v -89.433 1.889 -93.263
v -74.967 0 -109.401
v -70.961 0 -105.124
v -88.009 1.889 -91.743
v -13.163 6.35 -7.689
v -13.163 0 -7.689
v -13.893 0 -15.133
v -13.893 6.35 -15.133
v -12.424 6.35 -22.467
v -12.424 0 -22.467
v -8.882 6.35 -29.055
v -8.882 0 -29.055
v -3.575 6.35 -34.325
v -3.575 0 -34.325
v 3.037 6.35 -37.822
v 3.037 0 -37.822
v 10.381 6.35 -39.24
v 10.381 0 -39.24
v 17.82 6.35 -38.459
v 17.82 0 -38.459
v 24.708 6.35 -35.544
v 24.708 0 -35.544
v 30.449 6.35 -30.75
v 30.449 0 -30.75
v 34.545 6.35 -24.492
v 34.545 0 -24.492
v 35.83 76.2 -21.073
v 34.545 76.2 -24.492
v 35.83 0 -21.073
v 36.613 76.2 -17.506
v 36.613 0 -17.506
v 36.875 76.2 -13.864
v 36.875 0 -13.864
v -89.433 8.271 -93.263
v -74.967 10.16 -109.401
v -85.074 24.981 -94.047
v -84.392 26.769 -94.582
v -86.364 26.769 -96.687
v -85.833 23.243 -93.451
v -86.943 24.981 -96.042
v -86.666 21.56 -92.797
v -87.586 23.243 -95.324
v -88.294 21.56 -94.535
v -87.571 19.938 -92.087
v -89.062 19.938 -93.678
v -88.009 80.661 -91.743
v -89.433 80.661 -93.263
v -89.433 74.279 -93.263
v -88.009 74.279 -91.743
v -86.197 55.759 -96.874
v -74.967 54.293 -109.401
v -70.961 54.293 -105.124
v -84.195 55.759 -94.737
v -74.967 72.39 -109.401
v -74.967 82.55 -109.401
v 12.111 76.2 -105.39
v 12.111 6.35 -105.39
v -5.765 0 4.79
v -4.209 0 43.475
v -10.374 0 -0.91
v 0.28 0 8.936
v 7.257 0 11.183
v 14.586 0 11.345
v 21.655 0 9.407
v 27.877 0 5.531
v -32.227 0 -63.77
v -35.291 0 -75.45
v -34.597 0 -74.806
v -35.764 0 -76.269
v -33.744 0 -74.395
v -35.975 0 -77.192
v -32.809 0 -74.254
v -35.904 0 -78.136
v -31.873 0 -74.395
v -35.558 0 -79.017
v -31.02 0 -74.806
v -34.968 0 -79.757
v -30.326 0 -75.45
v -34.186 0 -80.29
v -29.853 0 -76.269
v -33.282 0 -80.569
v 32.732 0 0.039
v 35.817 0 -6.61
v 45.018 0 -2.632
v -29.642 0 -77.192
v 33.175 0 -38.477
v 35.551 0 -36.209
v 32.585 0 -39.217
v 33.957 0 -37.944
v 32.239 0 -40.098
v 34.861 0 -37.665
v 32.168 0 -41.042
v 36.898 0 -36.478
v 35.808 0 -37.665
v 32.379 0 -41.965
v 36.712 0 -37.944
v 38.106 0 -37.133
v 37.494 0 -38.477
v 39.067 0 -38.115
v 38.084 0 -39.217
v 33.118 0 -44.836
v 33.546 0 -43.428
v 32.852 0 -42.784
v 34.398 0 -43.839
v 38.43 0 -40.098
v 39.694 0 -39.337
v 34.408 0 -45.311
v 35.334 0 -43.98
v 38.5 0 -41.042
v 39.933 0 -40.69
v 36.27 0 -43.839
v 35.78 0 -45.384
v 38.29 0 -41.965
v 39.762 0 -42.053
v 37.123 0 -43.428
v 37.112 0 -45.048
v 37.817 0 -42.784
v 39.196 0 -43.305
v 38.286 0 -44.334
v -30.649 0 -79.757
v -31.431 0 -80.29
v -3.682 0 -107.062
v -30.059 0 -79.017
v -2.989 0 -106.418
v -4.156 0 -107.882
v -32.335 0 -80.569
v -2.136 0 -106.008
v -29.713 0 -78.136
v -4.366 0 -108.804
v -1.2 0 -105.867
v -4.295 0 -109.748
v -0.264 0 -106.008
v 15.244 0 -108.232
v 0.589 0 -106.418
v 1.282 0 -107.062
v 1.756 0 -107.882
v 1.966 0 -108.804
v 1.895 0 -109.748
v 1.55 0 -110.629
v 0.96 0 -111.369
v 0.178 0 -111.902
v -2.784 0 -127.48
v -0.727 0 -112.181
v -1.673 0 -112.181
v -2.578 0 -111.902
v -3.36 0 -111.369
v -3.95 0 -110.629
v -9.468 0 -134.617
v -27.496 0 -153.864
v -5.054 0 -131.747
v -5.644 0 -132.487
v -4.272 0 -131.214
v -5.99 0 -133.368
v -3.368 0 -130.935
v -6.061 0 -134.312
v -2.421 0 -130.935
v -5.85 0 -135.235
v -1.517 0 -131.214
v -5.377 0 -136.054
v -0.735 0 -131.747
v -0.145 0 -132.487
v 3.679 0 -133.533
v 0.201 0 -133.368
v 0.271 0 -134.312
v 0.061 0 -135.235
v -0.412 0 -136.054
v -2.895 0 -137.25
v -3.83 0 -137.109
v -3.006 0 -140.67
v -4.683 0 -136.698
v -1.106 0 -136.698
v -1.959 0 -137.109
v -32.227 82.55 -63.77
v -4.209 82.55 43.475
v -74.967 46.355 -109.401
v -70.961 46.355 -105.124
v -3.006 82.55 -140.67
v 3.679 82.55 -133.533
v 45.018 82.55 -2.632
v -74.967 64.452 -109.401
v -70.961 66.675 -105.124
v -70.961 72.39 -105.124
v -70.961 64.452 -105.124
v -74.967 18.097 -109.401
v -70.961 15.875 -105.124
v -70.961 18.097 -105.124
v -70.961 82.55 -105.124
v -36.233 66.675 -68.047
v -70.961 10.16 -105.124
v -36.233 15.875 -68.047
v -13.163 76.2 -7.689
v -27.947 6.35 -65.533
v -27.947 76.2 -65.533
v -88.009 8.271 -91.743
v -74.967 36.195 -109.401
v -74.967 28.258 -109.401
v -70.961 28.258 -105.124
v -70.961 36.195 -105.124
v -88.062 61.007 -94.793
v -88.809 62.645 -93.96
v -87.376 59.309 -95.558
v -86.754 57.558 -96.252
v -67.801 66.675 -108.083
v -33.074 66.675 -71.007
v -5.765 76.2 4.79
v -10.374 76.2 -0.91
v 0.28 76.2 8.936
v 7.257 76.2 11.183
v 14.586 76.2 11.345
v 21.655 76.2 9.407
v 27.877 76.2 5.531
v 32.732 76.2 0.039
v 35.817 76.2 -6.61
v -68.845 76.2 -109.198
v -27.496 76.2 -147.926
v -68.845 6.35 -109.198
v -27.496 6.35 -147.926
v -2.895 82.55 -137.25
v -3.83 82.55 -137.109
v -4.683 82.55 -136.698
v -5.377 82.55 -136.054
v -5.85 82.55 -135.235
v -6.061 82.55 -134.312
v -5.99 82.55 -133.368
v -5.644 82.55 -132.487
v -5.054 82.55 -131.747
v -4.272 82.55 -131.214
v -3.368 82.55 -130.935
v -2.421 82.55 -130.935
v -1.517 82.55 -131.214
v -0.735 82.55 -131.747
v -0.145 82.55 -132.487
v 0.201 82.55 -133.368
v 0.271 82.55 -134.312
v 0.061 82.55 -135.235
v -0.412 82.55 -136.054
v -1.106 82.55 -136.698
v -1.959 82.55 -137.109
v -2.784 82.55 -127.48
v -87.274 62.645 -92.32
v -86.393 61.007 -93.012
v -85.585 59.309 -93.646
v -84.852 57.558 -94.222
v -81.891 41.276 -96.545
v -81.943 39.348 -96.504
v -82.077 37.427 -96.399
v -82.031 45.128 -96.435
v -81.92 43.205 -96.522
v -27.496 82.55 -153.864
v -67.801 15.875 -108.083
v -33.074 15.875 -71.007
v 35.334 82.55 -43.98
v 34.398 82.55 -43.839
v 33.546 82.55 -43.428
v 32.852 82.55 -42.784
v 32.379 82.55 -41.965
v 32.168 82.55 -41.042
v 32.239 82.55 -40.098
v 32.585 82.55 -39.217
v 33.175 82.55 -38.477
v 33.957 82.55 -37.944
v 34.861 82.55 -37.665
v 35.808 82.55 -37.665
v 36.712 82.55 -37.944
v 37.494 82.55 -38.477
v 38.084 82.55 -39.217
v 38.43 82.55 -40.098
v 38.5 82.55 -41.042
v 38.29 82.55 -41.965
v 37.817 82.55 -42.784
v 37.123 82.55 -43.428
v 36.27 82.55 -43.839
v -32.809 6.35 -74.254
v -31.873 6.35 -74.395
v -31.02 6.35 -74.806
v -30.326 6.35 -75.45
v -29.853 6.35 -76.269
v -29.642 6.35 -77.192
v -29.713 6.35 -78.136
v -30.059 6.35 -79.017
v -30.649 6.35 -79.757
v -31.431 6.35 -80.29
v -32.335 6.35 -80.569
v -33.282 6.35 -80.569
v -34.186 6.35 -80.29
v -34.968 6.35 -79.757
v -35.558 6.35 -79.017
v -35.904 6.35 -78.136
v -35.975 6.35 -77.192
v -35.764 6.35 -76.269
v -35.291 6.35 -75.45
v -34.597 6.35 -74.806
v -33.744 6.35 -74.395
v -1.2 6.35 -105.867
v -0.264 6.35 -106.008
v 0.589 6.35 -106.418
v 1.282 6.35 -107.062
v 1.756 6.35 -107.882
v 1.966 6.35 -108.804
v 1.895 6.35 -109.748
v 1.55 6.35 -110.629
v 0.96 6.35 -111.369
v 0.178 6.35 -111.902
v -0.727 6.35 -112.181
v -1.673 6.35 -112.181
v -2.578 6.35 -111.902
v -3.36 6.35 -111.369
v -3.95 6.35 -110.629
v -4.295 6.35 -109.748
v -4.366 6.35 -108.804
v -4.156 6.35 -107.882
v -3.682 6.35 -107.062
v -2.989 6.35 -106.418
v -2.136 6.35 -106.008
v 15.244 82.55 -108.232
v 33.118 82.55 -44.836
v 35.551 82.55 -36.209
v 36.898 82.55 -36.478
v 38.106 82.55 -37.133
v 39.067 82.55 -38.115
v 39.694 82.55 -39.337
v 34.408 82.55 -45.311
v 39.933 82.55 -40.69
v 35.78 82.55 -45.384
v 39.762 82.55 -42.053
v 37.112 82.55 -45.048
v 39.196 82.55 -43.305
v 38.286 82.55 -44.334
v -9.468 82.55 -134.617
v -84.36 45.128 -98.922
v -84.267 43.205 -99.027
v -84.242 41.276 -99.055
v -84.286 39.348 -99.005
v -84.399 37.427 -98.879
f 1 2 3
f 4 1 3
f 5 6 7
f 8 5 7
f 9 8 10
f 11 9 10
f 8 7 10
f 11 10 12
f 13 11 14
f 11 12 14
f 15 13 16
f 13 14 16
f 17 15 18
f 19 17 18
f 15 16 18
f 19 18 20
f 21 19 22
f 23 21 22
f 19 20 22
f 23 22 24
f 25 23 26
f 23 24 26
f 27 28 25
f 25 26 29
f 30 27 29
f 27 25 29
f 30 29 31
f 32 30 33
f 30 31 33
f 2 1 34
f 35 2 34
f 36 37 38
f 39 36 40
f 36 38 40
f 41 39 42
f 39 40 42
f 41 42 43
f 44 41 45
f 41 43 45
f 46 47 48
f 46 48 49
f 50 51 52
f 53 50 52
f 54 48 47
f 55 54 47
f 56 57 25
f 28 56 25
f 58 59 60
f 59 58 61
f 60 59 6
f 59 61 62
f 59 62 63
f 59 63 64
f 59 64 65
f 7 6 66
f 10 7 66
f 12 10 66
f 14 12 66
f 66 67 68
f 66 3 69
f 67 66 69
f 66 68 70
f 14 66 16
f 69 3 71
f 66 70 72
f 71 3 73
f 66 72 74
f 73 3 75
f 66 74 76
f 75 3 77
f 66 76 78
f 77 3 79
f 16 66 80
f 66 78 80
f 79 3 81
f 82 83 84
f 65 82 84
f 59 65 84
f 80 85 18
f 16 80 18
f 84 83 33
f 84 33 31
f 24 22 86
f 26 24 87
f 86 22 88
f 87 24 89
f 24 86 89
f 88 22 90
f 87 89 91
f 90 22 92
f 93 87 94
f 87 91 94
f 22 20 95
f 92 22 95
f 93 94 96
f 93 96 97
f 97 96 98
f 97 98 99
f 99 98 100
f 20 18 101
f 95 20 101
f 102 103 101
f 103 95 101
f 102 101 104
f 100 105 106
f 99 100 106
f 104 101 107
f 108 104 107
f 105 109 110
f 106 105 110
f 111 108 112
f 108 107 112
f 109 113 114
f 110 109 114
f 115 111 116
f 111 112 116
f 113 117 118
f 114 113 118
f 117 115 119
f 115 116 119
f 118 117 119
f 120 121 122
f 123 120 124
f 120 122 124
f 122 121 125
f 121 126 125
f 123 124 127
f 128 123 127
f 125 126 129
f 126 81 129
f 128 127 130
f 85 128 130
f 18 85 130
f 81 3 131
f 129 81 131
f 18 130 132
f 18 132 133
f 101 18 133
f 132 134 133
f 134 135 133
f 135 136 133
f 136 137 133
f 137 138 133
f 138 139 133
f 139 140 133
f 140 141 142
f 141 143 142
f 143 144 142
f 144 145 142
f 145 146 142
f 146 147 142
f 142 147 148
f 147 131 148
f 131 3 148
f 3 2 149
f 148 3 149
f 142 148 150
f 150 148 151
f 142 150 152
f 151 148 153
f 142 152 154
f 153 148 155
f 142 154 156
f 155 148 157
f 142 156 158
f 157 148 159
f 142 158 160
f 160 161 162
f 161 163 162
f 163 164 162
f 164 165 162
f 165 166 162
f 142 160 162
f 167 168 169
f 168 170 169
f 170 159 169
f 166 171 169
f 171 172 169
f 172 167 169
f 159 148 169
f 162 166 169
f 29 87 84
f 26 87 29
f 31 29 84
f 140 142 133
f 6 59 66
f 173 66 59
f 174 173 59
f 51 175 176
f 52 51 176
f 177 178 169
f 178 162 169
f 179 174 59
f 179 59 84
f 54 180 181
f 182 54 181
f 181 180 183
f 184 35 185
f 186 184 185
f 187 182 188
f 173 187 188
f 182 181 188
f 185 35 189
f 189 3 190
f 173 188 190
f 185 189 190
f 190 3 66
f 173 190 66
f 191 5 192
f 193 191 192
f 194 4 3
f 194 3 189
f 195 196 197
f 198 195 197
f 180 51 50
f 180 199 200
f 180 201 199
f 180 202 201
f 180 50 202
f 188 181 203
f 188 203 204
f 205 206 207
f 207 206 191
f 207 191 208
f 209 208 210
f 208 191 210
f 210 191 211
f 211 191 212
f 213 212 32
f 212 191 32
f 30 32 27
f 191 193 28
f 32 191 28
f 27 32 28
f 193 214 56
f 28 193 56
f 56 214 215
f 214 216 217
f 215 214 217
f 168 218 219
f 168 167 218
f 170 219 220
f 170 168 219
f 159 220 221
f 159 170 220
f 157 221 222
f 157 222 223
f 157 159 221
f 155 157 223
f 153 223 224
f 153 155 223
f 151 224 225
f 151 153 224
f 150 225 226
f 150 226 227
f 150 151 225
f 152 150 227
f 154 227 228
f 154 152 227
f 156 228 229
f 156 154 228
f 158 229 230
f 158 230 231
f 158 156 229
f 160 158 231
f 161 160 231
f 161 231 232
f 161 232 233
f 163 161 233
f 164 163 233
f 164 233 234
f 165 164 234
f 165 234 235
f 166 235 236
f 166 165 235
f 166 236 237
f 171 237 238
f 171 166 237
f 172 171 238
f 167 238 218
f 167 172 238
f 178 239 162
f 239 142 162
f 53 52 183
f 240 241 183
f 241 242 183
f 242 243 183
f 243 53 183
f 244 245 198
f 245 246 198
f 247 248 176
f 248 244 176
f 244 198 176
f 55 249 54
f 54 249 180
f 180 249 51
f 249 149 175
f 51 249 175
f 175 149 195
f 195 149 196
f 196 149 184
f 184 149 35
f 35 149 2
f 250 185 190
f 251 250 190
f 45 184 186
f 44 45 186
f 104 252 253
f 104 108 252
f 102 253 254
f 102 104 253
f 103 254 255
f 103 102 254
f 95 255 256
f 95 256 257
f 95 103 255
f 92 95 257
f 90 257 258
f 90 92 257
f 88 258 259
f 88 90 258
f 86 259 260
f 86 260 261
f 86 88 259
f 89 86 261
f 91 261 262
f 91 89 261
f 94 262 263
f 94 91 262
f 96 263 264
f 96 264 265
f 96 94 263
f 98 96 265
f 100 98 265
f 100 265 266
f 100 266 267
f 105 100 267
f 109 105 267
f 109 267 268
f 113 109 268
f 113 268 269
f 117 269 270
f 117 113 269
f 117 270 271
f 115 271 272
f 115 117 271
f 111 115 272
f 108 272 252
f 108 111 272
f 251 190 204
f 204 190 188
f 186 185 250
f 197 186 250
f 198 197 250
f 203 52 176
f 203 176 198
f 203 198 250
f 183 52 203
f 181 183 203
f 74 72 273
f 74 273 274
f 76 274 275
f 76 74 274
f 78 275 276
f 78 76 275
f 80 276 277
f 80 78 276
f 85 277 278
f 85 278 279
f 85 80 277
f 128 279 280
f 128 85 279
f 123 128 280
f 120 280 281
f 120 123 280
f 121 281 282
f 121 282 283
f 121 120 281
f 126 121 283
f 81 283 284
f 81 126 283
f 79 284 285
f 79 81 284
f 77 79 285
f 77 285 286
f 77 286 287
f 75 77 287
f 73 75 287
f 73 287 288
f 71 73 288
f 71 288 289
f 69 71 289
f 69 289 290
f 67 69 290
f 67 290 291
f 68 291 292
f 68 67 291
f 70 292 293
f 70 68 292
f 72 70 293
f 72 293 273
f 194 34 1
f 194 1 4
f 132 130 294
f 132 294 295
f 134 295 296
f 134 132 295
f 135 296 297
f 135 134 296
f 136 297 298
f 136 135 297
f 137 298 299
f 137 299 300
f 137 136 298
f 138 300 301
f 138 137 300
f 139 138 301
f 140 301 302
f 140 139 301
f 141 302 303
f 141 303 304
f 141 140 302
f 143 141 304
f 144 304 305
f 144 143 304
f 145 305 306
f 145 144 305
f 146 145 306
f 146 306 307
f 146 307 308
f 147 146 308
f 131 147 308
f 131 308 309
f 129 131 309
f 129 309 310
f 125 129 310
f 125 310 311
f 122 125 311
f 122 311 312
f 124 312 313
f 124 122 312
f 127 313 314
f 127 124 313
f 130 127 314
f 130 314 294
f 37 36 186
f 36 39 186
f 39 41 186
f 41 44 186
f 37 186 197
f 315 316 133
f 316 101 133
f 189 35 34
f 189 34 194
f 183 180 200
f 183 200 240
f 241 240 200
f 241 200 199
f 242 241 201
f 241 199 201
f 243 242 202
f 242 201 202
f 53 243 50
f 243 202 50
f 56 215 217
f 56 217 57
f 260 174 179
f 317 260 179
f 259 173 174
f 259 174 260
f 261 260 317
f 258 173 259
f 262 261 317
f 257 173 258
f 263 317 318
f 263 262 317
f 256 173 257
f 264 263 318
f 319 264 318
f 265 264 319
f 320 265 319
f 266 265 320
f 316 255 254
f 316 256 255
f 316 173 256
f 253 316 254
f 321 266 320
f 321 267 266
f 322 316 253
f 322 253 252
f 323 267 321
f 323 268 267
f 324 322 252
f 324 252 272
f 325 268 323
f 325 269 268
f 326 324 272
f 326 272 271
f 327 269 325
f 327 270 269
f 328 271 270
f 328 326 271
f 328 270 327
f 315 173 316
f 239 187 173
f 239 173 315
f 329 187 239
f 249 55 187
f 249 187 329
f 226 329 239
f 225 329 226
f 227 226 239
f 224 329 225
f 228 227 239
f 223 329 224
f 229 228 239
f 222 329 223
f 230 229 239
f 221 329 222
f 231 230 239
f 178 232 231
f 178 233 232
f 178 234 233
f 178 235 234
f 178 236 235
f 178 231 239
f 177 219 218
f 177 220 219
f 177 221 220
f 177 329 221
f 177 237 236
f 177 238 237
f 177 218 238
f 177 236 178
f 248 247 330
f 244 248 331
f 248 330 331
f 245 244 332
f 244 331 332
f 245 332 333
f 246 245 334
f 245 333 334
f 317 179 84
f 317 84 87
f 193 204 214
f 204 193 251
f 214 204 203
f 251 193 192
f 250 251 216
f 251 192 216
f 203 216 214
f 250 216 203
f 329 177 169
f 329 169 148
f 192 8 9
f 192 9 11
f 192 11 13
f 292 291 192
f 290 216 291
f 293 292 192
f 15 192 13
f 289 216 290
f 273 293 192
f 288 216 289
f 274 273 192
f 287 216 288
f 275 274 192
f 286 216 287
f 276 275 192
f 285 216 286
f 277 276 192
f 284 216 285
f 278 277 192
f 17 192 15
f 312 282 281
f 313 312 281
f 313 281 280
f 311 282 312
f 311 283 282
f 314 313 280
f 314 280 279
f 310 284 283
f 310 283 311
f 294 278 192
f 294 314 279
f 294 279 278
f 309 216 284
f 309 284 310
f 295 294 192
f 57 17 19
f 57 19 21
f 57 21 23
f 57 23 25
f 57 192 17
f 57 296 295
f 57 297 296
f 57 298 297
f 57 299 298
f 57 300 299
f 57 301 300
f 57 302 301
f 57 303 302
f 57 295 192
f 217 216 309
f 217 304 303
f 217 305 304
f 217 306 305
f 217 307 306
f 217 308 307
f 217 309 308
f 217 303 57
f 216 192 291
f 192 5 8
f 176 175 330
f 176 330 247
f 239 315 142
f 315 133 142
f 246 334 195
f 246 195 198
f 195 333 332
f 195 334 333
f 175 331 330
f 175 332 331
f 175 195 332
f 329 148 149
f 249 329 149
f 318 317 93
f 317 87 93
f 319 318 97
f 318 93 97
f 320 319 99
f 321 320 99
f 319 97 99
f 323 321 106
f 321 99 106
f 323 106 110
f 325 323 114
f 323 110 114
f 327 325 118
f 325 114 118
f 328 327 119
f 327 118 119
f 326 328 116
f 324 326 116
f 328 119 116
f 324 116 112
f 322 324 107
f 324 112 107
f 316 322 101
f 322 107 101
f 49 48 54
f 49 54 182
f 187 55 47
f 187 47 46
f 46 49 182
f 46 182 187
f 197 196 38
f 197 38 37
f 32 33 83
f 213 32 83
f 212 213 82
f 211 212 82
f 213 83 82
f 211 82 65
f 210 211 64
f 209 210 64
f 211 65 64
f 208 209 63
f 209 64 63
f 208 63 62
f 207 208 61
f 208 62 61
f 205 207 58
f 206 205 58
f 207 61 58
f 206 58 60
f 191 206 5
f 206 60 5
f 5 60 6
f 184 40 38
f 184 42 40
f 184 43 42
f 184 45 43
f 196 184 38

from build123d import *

# Parameters (mm, degrees)
SKETCH1_R                     = 3.175
BOSS_EXTRUDE2_DEPTH           = 76.2
SKETCH1_5_R                   = 3.175
BOSS_EXTRUDE3_DEPTH           = 6.35
SKETCH5_R                     = 3.175
BOSS_EXTRUDE4_DEPTH           = 6.35
SKETCH6_W                     = 50.8
SKETCH6_H                     = 50.8
CUT_EXTRUDE1_DEPTH            = 21.59
SKETCH7_W                     = 5.86068256
SKETCH7_H                     = 10.16
BOSS_EXTRUDE5_DEPTH           = 21.59
BOSS_EXTRUDE5_DRAFT           = 5
BOSS_EXTRUDE5_PROFILE_2_DEPTH = 21.59
BOSS_EXTRUDE5_PROFILE_2_DRAFT = 5
BOSS_EXTRUDE5_PROFILE_3_DEPTH = 21.59
BOSS_EXTRUDE5_PROFILE_3_DRAFT = 5
BOSS_EXTRUDE5_PROFILE_4_DEPTH = 21.59
BOSS_EXTRUDE5_PROFILE_4_DRAFT = 5
BOSS_EXTRUDE5_PROFILE_5_DEPTH = 21.59
BOSS_EXTRUDE5_PROFILE_5_DRAFT = 5
SKETCH10_R                    = 36.051864109
CUT_EXTRUDE2_DEPTH            = 21.59


with BuildPart() as part:
    # Sketch1 → Boss-Extrude2 (new body)
    with BuildSketch(Plane(origin=(0, 0, 0), x_dir=(1, 0, 0), z_dir=(0, 1, 0))):
        with BuildLine():
            Line((-4.208751998, -43.475305064), (45.017746951, 2.631829887))
            Line((45.017746951, 2.631829887), (35.550660053, 36.209226482))
            ThreePointArc((35.550660053, 36.209226482), (39.762177432, 42.05307025), (33.11828595, 44.83625091))
            Line((33.11828595, 44.83625091), (15.243844224, 108.232438689))
            Line((15.243844224, 108.232438689), (-2.783728935, 127.479661752))
            Line((-2.783728935, 127.479661752), (3.678966496, 133.532831827))
            Line((3.678966496, 133.532831827), (-3.005742225, 140.669792455))
            Line((-3.005742225, 140.669792455), (-9.468437655, 134.61662238))
            Line((-9.468437655, 134.61662238), (-27.496010814, 153.863845442))
            Line((-27.496010814, 153.863845442), (-74.966911398, 109.401060841))
            Line((-74.966911398, 109.401060841), (-32.227053049, 63.769650553))
            Line((-32.227053049, 63.769650553), (-4.208751998, -43.475305064))
        make_face()
        with Locations((35.334305242, 40.804639607)):
            Circle(SKETCH1_R, mode=Mode.SUBTRACT)
        with BuildLine():
            Line((-27.946524097, 65.532765046), (-68.844709626, 109.197904706))
            Line((-68.844709626, 109.197904706), (-27.496010814, 147.926436632))
            Line((-27.496010814, 147.926436632), (12.111157264, 105.390011693))
            Line((12.111157264, 105.390011693), (34.544848217, 24.491577435))
            ThreePointArc((34.544848217, 24.491577435), (36.285698832, 19.303992732), (36.875100326, 13.863937421))
            ThreePointArc((36.875100326, 13.863937421), (14.585843996, -11.34485616), (-13.162952731, 7.689284266))
            Line((-13.162952731, 7.689284266), (-27.946524097, 65.532765046))
        make_face(mode=Mode.SUBTRACT)
        with Locations((-2.894634056, 134.074815557)):
            Circle(SKETCH1_R, mode=Mode.SUBTRACT)
    extrude(amount=BOSS_EXTRUDE2_DEPTH)

    # Sketch1<5> → Boss-Extrude3 (add)
    with BuildSketch(Plane(origin=(0, 0, 0), x_dir=(1, 0, 0), z_dir=(0, 1, 0))):
        with BuildLine():
            Line((-27.496010814, 147.926436632), (-68.844709626, 109.197904706))
            Line((-68.844709626, 109.197904706), (-27.946524097, 65.532765046))
            Line((-27.946524097, 65.532765046), (-13.162952731, 7.689284266))
            ThreePointArc((-13.162952731, 7.689284266), (3.03743719, 37.821521623), (34.544848217, 24.491577435))
            Line((34.544848217, 24.491577435), (12.111157264, 105.390011693))
            Line((12.111157264, 105.390011693), (-27.496010814, 147.926436632))
        make_face()
        with Locations((-32.808552916, 77.429328599)):
            Circle(SKETCH1_5_R, mode=Mode.SUBTRACT)
        with Locations((-1.199981142, 109.041759799)):
            Circle(SKETCH1_5_R, mode=Mode.SUBTRACT)
    extrude(amount=BOSS_EXTRUDE3_DEPTH)

    # Sketch5 → Boss-Extrude4 (add)
    with BuildSketch(Plane(origin=(0, 76.2, 0), x_dir=(1, 0, 0), z_dir=(0, 1, 0))):
        with BuildLine():
            Line((45.017746951, 2.631829887), (35.550660053, 36.209226482))
            ThreePointArc((35.550660053, 36.209226482), (39.762177432, 42.05307025), (33.11828595, 44.83625091))
            Line((33.11828595, 44.83625091), (15.243844224, 108.232438689))
            Line((15.243844224, 108.232438689), (-2.783728935, 127.479661752))
            Line((-2.783728935, 127.479661752), (3.678966496, 133.532831827))
            Line((3.678966496, 133.532831827), (-3.005742225, 140.669792455))
            Line((-3.005742225, 140.669792455), (-9.468437655, 134.61662238))
            Line((-9.468437655, 134.61662238), (-27.496010814, 153.863845442))
            Line((-27.496010814, 153.863845442), (-74.966911398, 109.401060841))
            Line((-74.966911398, 109.401060841), (-32.227053049, 63.769650553))
            Line((-32.227053049, 63.769650553), (-4.208751998, -43.475305064))
            Line((-4.208751998, -43.475305064), (45.017746951, 2.631829887))
        make_face()
        with Locations((-2.894634056, 134.074815557)):
            Circle(SKETCH5_R, mode=Mode.SUBTRACT)
        with Locations((35.334305242, 40.804639607)):
            Circle(SKETCH5_R, mode=Mode.SUBTRACT)
    extrude(amount=BOSS_EXTRUDE4_DEPTH)

    # Sketch6 → Cut-Extrude1 (cut)
    with BuildSketch(Plane(origin=(14.64974053, 0, -13.721421958), x_dir=(0.683604049055853, 0, 0.729853070223345), z_dir=(-0.729853070223345, 0, 0.683604049055853))):
        with Locations((-99.833701757, 41.275)):
            Rectangle(SKETCH6_W, SKETCH6_H)
    extrude(amount=-CUT_EXTRUDE1_DEPTH, mode=Mode.SUBTRACT)


with BuildPart() as boss_extrude5_tool:
    # Sketch7 → Boss-Extrude5 (with draft: the straight prism first)
    with BuildSketch(Plane(origin=(14.64974053, 0, -13.721421958), x_dir=(0.683604049055853, 0, 0.729853070223345), z_dir=(-0.729853070223345, 0, 0.683604049055853))):
        with Locations((-128.164043037, 77.47)):
            Rectangle(SKETCH7_W, SKETCH7_H)
    extrude(amount=BOSS_EXTRUDE5_DEPTH)
    # Boss-Extrude5: the draft: its side faces are tilted about the plane it starts from
    boss_extrude5_sides = [boss_extrude5_tool.faces().sort_by_distance(p)[0] for p in [
        (-82.845675291, 77.47, -102.021555132),
        (-80.842482126, 72.39, -99.882836552),
        (-78.839288962, 77.47, -97.744117972),
        (-80.842482126, 82.55, -99.882836552),
    ]]
    draft(boss_extrude5_sides, Plane(origin=(14.64974053, 0, -13.721421958), x_dir=(0.683604049055853, 0, 0.729853070223345), z_dir=(-0.729853070223345, 0, 0.683604049055853)), BOSS_EXTRUDE5_DRAFT)


with BuildPart() as part_1:
    add(part.part)

    # Boss-Extrude5: add boss_extrude5_tool
    add(boss_extrude5_tool.part)


with BuildPart() as boss_extrude5_profile_2_tool:
    # Sketch7 → Boss-Extrude5 profile 2 (with draft: the straight prism first)
    with BuildSketch(Plane(origin=(14.64974053, 0, -13.721421958), x_dir=(0.683604049055853, 0, 0.729853070223345), z_dir=(-0.729853070223345, 0, 0.683604049055853))):
        with Locations((-128.164043037, 59.3725)):
            Rectangle(SKETCH7_W, SKETCH7_H)
    extrude(amount=BOSS_EXTRUDE5_PROFILE_2_DEPTH)
    # Boss-Extrude5 profile 2: the draft: its side faces are tilted about the plane it starts from
    boss_extrude5_profile_2_sides = [boss_extrude5_profile_2_tool.faces().sort_by_distance(p)[0] for p in [
        (-80.842482126, 54.2925, -99.882836552),
        (-78.839288962, 59.3725, -97.744117972),
        (-80.842482126, 64.4525, -99.882836552),
        (-82.845675291, 59.3725, -102.021555132),
    ]]
    draft(boss_extrude5_profile_2_sides, Plane(origin=(14.64974053, 0, -13.721421958), x_dir=(0.683604049055853, 0, 0.729853070223345), z_dir=(-0.729853070223345, 0, 0.683604049055853)), BOSS_EXTRUDE5_PROFILE_2_DRAFT)


with BuildPart() as part_2:
    add(part_1.part)

    # Boss-Extrude5 profile 2: add boss_extrude5_profile_2_tool
    add(boss_extrude5_profile_2_tool.part)


with BuildPart() as boss_extrude5_profile_3_tool:
    # Sketch7 → Boss-Extrude5 profile 3 (with draft: the straight prism first)
    with BuildSketch(Plane(origin=(14.64974053, 0, -13.721421958), x_dir=(0.683604049055853, 0, 0.729853070223345), z_dir=(-0.729853070223345, 0, 0.683604049055853))):
        with Locations((-128.164043037, 41.275)):
            Rectangle(SKETCH7_W, SKETCH7_H)
    extrude(amount=BOSS_EXTRUDE5_PROFILE_3_DEPTH)
    # Boss-Extrude5 profile 3: the draft: its side faces are tilted about the plane it starts from
    boss_extrude5_profile_3_sides = [boss_extrude5_profile_3_tool.faces().sort_by_distance(p)[0] for p in [
        (-80.842482126, 36.195, -99.882836552),
        (-78.839288962, 41.275, -97.744117972),
        (-80.842482126, 46.355, -99.882836552),
        (-82.845675291, 41.275, -102.021555132),
    ]]
    draft(boss_extrude5_profile_3_sides, Plane(origin=(14.64974053, 0, -13.721421958), x_dir=(0.683604049055853, 0, 0.729853070223345), z_dir=(-0.729853070223345, 0, 0.683604049055853)), BOSS_EXTRUDE5_PROFILE_3_DRAFT)


with BuildPart() as part_3:
    add(part_2.part)

    # Boss-Extrude5 profile 3: add boss_extrude5_profile_3_tool
    add(boss_extrude5_profile_3_tool.part)


with BuildPart() as boss_extrude5_profile_4_tool:
    # Sketch7 → Boss-Extrude5 profile 4 (with draft: the straight prism first)
    with BuildSketch(Plane(origin=(14.64974053, 0, -13.721421958), x_dir=(0.683604049055853, 0, 0.729853070223345), z_dir=(-0.729853070223345, 0, 0.683604049055853))):
        with Locations((-128.164043037, 23.1775)):
            Rectangle(SKETCH7_W, SKETCH7_H)
    extrude(amount=BOSS_EXTRUDE5_PROFILE_4_DEPTH)
    # Boss-Extrude5 profile 4: the draft: its side faces are tilted about the plane it starts from
    boss_extrude5_profile_4_sides = [boss_extrude5_profile_4_tool.faces().sort_by_distance(p)[0] for p in [
        (-80.842482126, 18.0975, -99.882836552),
        (-78.839288962, 23.1775, -97.744117972),
        (-80.842482126, 28.2575, -99.882836552),
        (-82.845675291, 23.1775, -102.021555132),
    ]]
    draft(boss_extrude5_profile_4_sides, Plane(origin=(14.64974053, 0, -13.721421958), x_dir=(0.683604049055853, 0, 0.729853070223345), z_dir=(-0.729853070223345, 0, 0.683604049055853)), BOSS_EXTRUDE5_PROFILE_4_DRAFT)


with BuildPart() as part_4:
    add(part_3.part)

    # Boss-Extrude5 profile 4: add boss_extrude5_profile_4_tool
    add(boss_extrude5_profile_4_tool.part)


with BuildPart() as boss_extrude5_profile_5_tool:
    # Sketch7 → Boss-Extrude5 profile 5 (with draft: the straight prism first)
    with BuildSketch(Plane(origin=(14.64974053, 0, -13.721421958), x_dir=(0.683604049055853, 0, 0.729853070223345), z_dir=(-0.729853070223345, 0, 0.683604049055853))):
        with Locations((-128.164043037, 5.08)):
            Rectangle(SKETCH7_W, SKETCH7_H)
    extrude(amount=BOSS_EXTRUDE5_PROFILE_5_DEPTH)
    # Boss-Extrude5 profile 5: the draft: its side faces are tilted about the plane it starts from
    boss_extrude5_profile_5_sides = [boss_extrude5_profile_5_tool.faces().sort_by_distance(p)[0] for p in [
        (-80.842482126, 0, -99.882836552),
        (-78.839288962, 5.08, -97.744117972),
        (-80.842482126, 10.16, -99.882836552),
        (-82.845675291, 5.08, -102.021555132),
    ]]
    draft(boss_extrude5_profile_5_sides, Plane(origin=(14.64974053, 0, -13.721421958), x_dir=(0.683604049055853, 0, 0.729853070223345), z_dir=(-0.729853070223345, 0, 0.683604049055853)), BOSS_EXTRUDE5_PROFILE_5_DRAFT)


with BuildPart() as part_5:
    add(part_4.part)

    # Boss-Extrude5 profile 5: add boss_extrude5_profile_5_tool
    add(boss_extrude5_profile_5_tool.part)

    # Sketch10 → Cut-Extrude2 (cut)
    with BuildSketch(Plane(origin=(-89.616651928, 0, -95.679638883), x_dir=(-0.7298530702233451, 0, 0.683604049055853), z_dir=(-0.683604049055853, 0, -0.7298530702233451))):
        with Locations((29.820674878, 41.547690044)):
            Circle(SKETCH10_R)
    extrude(amount=-CUT_EXTRUDE2_DEPTH, mode=Mode.SUBTRACT)


solid = part_5.part
